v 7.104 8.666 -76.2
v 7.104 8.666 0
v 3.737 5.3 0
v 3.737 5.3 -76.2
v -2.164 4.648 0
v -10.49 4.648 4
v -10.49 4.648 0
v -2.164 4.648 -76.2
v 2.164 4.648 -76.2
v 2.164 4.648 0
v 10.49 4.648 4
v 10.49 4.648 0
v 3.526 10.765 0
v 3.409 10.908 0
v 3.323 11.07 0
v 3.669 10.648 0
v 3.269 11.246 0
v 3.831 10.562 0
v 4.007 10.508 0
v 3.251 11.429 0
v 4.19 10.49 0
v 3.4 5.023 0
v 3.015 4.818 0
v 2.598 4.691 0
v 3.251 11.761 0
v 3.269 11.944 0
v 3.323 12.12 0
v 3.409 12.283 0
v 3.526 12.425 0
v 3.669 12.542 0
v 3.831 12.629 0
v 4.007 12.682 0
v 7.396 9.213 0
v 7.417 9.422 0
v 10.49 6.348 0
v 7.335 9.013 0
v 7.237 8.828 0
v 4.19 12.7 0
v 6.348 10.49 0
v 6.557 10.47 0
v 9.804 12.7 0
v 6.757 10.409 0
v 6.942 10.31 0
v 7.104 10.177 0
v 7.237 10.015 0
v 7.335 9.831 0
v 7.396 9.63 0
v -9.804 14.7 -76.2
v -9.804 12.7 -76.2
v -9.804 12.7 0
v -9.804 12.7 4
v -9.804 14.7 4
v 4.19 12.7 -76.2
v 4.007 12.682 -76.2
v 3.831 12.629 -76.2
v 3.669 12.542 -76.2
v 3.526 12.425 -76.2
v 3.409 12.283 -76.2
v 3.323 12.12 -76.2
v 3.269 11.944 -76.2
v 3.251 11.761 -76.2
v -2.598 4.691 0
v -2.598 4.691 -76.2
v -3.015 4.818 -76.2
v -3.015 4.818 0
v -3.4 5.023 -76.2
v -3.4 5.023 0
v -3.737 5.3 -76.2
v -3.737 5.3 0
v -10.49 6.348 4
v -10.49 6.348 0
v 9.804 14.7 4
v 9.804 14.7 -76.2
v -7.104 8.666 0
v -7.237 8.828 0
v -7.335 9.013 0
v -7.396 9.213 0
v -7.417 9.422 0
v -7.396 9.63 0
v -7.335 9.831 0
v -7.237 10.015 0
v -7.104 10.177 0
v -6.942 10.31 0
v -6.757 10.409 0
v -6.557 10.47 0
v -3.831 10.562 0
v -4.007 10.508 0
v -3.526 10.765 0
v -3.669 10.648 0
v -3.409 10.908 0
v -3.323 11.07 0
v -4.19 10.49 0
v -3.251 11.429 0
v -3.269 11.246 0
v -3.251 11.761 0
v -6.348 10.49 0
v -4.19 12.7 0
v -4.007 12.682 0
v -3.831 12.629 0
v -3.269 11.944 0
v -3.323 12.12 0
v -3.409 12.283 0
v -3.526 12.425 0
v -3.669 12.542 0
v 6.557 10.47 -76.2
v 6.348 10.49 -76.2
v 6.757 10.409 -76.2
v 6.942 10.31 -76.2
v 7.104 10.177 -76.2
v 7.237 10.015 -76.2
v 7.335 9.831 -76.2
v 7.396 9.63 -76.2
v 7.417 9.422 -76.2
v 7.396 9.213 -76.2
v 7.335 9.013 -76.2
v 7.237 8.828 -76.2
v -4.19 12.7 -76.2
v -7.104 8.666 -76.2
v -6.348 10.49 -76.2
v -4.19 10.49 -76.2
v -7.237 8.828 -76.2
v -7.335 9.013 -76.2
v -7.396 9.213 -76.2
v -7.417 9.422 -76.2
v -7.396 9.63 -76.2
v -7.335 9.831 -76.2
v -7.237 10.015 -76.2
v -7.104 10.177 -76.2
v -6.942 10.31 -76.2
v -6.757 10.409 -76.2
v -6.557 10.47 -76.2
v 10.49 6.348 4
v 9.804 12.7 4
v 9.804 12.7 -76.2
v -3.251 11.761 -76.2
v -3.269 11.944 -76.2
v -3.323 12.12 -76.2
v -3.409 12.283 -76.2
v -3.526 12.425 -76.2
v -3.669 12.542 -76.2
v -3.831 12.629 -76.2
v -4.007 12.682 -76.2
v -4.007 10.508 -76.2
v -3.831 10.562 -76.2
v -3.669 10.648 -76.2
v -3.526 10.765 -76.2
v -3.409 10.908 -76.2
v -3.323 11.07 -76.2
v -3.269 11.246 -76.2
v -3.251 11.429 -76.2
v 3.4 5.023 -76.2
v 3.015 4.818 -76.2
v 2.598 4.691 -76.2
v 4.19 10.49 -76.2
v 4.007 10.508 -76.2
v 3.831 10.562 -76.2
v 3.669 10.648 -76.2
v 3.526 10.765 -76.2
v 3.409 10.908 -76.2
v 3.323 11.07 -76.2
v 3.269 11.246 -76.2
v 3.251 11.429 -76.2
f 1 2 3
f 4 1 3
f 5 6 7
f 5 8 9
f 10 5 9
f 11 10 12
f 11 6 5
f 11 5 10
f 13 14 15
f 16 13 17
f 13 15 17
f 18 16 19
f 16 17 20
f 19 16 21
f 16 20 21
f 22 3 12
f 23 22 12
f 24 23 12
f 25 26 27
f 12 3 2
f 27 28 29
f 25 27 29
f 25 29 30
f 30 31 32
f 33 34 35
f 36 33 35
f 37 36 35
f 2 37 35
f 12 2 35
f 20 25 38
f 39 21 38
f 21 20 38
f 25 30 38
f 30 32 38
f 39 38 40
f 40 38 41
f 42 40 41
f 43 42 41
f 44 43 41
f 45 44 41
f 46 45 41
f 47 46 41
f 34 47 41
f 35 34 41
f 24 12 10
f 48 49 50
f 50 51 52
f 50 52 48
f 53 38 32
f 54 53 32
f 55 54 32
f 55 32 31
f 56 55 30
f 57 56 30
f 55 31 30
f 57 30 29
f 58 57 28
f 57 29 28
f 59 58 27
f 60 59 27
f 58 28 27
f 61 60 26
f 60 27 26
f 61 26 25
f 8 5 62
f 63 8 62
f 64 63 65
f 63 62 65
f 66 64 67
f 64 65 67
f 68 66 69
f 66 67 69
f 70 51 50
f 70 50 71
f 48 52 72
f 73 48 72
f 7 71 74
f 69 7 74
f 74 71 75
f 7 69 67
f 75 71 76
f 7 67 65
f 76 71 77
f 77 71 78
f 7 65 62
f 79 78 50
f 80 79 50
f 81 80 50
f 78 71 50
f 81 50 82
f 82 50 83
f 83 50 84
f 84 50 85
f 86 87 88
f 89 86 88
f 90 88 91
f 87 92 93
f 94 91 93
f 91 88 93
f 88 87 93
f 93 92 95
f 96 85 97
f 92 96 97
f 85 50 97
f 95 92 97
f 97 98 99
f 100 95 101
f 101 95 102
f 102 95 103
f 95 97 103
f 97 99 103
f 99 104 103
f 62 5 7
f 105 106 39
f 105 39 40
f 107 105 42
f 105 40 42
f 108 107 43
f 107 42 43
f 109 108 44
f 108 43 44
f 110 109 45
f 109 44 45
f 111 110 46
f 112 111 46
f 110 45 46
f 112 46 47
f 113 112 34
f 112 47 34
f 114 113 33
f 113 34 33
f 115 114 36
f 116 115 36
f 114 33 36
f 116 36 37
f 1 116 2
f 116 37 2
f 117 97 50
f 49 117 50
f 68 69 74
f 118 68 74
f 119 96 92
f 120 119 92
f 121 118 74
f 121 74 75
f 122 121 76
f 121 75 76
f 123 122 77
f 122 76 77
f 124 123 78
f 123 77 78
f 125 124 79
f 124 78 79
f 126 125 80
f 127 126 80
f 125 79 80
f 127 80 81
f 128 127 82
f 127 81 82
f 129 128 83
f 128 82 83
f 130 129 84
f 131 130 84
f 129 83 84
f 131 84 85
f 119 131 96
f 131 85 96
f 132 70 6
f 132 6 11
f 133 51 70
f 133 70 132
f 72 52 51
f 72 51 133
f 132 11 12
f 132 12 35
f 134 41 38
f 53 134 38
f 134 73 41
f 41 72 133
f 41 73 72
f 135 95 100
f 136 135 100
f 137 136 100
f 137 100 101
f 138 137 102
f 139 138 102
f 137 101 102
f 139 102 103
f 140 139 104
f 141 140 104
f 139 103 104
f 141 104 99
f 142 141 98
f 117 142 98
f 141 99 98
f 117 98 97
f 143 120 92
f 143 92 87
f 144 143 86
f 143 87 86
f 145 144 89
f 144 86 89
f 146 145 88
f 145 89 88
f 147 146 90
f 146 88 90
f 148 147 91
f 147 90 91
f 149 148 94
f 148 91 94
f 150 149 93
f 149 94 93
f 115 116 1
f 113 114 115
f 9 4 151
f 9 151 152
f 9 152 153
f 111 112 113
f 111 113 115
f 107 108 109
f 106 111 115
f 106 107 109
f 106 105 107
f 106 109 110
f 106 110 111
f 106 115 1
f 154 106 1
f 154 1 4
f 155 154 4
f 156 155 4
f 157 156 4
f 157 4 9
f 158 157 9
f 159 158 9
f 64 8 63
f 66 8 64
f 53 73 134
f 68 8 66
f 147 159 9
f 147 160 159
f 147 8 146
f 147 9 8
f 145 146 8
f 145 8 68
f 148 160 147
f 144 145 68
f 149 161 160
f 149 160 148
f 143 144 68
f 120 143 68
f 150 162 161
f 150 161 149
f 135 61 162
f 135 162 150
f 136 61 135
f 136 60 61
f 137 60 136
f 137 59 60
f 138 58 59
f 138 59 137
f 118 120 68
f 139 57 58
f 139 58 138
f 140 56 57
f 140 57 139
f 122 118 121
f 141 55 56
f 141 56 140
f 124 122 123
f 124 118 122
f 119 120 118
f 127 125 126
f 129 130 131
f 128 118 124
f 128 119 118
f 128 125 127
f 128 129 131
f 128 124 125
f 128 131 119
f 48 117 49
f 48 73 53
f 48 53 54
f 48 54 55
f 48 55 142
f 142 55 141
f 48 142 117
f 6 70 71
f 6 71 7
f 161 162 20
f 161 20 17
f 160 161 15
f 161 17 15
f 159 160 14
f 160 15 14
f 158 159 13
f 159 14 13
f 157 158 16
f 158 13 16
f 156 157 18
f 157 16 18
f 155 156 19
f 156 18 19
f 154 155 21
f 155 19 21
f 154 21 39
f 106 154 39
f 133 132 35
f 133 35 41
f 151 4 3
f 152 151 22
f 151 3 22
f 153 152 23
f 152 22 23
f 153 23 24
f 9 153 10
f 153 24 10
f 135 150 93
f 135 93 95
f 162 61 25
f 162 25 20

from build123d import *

# Parameters (mm, degrees)
BOSS_EXTRUDE1_DEPTH = 76.2
BOSS_EXTRUDE2_DEPTH = 4


with BuildPart() as part:
    # Sketch1 → Boss-Extrude1 (new body)
    with BuildSketch(Plane.XY):
        with BuildLine():
            Line((-3.2512, 11.760835), (-3.2512, 11.429365))
            ThreePointArc((-3.2512, 11.429365), (-3.52627506, 10.76527506), (-4.190365, 10.4902))
            Line((-4.190365, 10.4902), (-6.348478019, 10.4902))
            ThreePointArc((-6.348478019, 10.4902), (-7.335478831, 9.830707141), (-7.103895736, 8.666460301))
            Line((-7.103895736, 8.666460301), (-3.737334563, 5.299899128))
            ThreePointArc((-3.737334563, 5.299899128), (-3.015479634, 4.817571085), (-2.16399369, 4.6482))
            Line((-2.16399369, 4.6482), (2.16399369, 4.6482))
            ThreePointArc((2.16399369, 4.6482), (3.015479634, 4.817571085), (3.737334563, 5.299899128))
            Line((3.737334563, 5.299899128), (7.103895736, 8.666460301))
            ThreePointArc((7.103895736, 8.666460301), (7.335478831, 9.830707141), (6.348478019, 10.4902))
            Line((6.348478019, 10.4902), (4.190365, 10.4902))
            ThreePointArc((4.190365, 10.4902), (3.52627506, 10.76527506), (3.2512, 11.429365))
            Line((3.2512, 11.429365), (3.2512, 11.760835))
            ThreePointArc((3.2512, 11.760835), (3.52627506, 12.42492494), (4.190365, 12.7))
            Line((4.190365, 12.7), (5.243578019, 12.7))
            Line((5.243578019, 12.7), (6.348478019, 12.7))
            Line((6.348478019, 12.7), (9.803703152, 12.7))
            Line((9.803703152, 12.7), (9.803703152, 14.7))
            Line((9.803703152, 14.7), (-9.803703152, 14.7))
            Line((-9.803703152, 14.7), (-9.803703152, 12.7))
            Line((-9.803703152, 12.7), (-5.243578019, 12.7))
            Line((-5.243578019, 12.7), (-4.190365, 12.7))
            ThreePointArc((-4.190365, 12.7), (-3.52627506, 12.42492494), (-3.2512, 11.760835))
        make_face()
    extrude(amount=-BOSS_EXTRUDE1_DEPTH)

    # Sketch1<3> → Boss-Extrude2 (add)
    with BuildSketch(Plane.XY):
        Polygon((-10.4902, 4.6482), (10.4902, 4.6482), (10.4902, 6.348478019), (9.803703152, 12.7), (9.803703152, 14.7), (-9.803703152, 14.7), (-9.803703152, 12.7), (-10.4902, 6.348478019), align=None)
    extrude(amount=BOSS_EXTRUDE2_DEPTH)


solid = part.part
